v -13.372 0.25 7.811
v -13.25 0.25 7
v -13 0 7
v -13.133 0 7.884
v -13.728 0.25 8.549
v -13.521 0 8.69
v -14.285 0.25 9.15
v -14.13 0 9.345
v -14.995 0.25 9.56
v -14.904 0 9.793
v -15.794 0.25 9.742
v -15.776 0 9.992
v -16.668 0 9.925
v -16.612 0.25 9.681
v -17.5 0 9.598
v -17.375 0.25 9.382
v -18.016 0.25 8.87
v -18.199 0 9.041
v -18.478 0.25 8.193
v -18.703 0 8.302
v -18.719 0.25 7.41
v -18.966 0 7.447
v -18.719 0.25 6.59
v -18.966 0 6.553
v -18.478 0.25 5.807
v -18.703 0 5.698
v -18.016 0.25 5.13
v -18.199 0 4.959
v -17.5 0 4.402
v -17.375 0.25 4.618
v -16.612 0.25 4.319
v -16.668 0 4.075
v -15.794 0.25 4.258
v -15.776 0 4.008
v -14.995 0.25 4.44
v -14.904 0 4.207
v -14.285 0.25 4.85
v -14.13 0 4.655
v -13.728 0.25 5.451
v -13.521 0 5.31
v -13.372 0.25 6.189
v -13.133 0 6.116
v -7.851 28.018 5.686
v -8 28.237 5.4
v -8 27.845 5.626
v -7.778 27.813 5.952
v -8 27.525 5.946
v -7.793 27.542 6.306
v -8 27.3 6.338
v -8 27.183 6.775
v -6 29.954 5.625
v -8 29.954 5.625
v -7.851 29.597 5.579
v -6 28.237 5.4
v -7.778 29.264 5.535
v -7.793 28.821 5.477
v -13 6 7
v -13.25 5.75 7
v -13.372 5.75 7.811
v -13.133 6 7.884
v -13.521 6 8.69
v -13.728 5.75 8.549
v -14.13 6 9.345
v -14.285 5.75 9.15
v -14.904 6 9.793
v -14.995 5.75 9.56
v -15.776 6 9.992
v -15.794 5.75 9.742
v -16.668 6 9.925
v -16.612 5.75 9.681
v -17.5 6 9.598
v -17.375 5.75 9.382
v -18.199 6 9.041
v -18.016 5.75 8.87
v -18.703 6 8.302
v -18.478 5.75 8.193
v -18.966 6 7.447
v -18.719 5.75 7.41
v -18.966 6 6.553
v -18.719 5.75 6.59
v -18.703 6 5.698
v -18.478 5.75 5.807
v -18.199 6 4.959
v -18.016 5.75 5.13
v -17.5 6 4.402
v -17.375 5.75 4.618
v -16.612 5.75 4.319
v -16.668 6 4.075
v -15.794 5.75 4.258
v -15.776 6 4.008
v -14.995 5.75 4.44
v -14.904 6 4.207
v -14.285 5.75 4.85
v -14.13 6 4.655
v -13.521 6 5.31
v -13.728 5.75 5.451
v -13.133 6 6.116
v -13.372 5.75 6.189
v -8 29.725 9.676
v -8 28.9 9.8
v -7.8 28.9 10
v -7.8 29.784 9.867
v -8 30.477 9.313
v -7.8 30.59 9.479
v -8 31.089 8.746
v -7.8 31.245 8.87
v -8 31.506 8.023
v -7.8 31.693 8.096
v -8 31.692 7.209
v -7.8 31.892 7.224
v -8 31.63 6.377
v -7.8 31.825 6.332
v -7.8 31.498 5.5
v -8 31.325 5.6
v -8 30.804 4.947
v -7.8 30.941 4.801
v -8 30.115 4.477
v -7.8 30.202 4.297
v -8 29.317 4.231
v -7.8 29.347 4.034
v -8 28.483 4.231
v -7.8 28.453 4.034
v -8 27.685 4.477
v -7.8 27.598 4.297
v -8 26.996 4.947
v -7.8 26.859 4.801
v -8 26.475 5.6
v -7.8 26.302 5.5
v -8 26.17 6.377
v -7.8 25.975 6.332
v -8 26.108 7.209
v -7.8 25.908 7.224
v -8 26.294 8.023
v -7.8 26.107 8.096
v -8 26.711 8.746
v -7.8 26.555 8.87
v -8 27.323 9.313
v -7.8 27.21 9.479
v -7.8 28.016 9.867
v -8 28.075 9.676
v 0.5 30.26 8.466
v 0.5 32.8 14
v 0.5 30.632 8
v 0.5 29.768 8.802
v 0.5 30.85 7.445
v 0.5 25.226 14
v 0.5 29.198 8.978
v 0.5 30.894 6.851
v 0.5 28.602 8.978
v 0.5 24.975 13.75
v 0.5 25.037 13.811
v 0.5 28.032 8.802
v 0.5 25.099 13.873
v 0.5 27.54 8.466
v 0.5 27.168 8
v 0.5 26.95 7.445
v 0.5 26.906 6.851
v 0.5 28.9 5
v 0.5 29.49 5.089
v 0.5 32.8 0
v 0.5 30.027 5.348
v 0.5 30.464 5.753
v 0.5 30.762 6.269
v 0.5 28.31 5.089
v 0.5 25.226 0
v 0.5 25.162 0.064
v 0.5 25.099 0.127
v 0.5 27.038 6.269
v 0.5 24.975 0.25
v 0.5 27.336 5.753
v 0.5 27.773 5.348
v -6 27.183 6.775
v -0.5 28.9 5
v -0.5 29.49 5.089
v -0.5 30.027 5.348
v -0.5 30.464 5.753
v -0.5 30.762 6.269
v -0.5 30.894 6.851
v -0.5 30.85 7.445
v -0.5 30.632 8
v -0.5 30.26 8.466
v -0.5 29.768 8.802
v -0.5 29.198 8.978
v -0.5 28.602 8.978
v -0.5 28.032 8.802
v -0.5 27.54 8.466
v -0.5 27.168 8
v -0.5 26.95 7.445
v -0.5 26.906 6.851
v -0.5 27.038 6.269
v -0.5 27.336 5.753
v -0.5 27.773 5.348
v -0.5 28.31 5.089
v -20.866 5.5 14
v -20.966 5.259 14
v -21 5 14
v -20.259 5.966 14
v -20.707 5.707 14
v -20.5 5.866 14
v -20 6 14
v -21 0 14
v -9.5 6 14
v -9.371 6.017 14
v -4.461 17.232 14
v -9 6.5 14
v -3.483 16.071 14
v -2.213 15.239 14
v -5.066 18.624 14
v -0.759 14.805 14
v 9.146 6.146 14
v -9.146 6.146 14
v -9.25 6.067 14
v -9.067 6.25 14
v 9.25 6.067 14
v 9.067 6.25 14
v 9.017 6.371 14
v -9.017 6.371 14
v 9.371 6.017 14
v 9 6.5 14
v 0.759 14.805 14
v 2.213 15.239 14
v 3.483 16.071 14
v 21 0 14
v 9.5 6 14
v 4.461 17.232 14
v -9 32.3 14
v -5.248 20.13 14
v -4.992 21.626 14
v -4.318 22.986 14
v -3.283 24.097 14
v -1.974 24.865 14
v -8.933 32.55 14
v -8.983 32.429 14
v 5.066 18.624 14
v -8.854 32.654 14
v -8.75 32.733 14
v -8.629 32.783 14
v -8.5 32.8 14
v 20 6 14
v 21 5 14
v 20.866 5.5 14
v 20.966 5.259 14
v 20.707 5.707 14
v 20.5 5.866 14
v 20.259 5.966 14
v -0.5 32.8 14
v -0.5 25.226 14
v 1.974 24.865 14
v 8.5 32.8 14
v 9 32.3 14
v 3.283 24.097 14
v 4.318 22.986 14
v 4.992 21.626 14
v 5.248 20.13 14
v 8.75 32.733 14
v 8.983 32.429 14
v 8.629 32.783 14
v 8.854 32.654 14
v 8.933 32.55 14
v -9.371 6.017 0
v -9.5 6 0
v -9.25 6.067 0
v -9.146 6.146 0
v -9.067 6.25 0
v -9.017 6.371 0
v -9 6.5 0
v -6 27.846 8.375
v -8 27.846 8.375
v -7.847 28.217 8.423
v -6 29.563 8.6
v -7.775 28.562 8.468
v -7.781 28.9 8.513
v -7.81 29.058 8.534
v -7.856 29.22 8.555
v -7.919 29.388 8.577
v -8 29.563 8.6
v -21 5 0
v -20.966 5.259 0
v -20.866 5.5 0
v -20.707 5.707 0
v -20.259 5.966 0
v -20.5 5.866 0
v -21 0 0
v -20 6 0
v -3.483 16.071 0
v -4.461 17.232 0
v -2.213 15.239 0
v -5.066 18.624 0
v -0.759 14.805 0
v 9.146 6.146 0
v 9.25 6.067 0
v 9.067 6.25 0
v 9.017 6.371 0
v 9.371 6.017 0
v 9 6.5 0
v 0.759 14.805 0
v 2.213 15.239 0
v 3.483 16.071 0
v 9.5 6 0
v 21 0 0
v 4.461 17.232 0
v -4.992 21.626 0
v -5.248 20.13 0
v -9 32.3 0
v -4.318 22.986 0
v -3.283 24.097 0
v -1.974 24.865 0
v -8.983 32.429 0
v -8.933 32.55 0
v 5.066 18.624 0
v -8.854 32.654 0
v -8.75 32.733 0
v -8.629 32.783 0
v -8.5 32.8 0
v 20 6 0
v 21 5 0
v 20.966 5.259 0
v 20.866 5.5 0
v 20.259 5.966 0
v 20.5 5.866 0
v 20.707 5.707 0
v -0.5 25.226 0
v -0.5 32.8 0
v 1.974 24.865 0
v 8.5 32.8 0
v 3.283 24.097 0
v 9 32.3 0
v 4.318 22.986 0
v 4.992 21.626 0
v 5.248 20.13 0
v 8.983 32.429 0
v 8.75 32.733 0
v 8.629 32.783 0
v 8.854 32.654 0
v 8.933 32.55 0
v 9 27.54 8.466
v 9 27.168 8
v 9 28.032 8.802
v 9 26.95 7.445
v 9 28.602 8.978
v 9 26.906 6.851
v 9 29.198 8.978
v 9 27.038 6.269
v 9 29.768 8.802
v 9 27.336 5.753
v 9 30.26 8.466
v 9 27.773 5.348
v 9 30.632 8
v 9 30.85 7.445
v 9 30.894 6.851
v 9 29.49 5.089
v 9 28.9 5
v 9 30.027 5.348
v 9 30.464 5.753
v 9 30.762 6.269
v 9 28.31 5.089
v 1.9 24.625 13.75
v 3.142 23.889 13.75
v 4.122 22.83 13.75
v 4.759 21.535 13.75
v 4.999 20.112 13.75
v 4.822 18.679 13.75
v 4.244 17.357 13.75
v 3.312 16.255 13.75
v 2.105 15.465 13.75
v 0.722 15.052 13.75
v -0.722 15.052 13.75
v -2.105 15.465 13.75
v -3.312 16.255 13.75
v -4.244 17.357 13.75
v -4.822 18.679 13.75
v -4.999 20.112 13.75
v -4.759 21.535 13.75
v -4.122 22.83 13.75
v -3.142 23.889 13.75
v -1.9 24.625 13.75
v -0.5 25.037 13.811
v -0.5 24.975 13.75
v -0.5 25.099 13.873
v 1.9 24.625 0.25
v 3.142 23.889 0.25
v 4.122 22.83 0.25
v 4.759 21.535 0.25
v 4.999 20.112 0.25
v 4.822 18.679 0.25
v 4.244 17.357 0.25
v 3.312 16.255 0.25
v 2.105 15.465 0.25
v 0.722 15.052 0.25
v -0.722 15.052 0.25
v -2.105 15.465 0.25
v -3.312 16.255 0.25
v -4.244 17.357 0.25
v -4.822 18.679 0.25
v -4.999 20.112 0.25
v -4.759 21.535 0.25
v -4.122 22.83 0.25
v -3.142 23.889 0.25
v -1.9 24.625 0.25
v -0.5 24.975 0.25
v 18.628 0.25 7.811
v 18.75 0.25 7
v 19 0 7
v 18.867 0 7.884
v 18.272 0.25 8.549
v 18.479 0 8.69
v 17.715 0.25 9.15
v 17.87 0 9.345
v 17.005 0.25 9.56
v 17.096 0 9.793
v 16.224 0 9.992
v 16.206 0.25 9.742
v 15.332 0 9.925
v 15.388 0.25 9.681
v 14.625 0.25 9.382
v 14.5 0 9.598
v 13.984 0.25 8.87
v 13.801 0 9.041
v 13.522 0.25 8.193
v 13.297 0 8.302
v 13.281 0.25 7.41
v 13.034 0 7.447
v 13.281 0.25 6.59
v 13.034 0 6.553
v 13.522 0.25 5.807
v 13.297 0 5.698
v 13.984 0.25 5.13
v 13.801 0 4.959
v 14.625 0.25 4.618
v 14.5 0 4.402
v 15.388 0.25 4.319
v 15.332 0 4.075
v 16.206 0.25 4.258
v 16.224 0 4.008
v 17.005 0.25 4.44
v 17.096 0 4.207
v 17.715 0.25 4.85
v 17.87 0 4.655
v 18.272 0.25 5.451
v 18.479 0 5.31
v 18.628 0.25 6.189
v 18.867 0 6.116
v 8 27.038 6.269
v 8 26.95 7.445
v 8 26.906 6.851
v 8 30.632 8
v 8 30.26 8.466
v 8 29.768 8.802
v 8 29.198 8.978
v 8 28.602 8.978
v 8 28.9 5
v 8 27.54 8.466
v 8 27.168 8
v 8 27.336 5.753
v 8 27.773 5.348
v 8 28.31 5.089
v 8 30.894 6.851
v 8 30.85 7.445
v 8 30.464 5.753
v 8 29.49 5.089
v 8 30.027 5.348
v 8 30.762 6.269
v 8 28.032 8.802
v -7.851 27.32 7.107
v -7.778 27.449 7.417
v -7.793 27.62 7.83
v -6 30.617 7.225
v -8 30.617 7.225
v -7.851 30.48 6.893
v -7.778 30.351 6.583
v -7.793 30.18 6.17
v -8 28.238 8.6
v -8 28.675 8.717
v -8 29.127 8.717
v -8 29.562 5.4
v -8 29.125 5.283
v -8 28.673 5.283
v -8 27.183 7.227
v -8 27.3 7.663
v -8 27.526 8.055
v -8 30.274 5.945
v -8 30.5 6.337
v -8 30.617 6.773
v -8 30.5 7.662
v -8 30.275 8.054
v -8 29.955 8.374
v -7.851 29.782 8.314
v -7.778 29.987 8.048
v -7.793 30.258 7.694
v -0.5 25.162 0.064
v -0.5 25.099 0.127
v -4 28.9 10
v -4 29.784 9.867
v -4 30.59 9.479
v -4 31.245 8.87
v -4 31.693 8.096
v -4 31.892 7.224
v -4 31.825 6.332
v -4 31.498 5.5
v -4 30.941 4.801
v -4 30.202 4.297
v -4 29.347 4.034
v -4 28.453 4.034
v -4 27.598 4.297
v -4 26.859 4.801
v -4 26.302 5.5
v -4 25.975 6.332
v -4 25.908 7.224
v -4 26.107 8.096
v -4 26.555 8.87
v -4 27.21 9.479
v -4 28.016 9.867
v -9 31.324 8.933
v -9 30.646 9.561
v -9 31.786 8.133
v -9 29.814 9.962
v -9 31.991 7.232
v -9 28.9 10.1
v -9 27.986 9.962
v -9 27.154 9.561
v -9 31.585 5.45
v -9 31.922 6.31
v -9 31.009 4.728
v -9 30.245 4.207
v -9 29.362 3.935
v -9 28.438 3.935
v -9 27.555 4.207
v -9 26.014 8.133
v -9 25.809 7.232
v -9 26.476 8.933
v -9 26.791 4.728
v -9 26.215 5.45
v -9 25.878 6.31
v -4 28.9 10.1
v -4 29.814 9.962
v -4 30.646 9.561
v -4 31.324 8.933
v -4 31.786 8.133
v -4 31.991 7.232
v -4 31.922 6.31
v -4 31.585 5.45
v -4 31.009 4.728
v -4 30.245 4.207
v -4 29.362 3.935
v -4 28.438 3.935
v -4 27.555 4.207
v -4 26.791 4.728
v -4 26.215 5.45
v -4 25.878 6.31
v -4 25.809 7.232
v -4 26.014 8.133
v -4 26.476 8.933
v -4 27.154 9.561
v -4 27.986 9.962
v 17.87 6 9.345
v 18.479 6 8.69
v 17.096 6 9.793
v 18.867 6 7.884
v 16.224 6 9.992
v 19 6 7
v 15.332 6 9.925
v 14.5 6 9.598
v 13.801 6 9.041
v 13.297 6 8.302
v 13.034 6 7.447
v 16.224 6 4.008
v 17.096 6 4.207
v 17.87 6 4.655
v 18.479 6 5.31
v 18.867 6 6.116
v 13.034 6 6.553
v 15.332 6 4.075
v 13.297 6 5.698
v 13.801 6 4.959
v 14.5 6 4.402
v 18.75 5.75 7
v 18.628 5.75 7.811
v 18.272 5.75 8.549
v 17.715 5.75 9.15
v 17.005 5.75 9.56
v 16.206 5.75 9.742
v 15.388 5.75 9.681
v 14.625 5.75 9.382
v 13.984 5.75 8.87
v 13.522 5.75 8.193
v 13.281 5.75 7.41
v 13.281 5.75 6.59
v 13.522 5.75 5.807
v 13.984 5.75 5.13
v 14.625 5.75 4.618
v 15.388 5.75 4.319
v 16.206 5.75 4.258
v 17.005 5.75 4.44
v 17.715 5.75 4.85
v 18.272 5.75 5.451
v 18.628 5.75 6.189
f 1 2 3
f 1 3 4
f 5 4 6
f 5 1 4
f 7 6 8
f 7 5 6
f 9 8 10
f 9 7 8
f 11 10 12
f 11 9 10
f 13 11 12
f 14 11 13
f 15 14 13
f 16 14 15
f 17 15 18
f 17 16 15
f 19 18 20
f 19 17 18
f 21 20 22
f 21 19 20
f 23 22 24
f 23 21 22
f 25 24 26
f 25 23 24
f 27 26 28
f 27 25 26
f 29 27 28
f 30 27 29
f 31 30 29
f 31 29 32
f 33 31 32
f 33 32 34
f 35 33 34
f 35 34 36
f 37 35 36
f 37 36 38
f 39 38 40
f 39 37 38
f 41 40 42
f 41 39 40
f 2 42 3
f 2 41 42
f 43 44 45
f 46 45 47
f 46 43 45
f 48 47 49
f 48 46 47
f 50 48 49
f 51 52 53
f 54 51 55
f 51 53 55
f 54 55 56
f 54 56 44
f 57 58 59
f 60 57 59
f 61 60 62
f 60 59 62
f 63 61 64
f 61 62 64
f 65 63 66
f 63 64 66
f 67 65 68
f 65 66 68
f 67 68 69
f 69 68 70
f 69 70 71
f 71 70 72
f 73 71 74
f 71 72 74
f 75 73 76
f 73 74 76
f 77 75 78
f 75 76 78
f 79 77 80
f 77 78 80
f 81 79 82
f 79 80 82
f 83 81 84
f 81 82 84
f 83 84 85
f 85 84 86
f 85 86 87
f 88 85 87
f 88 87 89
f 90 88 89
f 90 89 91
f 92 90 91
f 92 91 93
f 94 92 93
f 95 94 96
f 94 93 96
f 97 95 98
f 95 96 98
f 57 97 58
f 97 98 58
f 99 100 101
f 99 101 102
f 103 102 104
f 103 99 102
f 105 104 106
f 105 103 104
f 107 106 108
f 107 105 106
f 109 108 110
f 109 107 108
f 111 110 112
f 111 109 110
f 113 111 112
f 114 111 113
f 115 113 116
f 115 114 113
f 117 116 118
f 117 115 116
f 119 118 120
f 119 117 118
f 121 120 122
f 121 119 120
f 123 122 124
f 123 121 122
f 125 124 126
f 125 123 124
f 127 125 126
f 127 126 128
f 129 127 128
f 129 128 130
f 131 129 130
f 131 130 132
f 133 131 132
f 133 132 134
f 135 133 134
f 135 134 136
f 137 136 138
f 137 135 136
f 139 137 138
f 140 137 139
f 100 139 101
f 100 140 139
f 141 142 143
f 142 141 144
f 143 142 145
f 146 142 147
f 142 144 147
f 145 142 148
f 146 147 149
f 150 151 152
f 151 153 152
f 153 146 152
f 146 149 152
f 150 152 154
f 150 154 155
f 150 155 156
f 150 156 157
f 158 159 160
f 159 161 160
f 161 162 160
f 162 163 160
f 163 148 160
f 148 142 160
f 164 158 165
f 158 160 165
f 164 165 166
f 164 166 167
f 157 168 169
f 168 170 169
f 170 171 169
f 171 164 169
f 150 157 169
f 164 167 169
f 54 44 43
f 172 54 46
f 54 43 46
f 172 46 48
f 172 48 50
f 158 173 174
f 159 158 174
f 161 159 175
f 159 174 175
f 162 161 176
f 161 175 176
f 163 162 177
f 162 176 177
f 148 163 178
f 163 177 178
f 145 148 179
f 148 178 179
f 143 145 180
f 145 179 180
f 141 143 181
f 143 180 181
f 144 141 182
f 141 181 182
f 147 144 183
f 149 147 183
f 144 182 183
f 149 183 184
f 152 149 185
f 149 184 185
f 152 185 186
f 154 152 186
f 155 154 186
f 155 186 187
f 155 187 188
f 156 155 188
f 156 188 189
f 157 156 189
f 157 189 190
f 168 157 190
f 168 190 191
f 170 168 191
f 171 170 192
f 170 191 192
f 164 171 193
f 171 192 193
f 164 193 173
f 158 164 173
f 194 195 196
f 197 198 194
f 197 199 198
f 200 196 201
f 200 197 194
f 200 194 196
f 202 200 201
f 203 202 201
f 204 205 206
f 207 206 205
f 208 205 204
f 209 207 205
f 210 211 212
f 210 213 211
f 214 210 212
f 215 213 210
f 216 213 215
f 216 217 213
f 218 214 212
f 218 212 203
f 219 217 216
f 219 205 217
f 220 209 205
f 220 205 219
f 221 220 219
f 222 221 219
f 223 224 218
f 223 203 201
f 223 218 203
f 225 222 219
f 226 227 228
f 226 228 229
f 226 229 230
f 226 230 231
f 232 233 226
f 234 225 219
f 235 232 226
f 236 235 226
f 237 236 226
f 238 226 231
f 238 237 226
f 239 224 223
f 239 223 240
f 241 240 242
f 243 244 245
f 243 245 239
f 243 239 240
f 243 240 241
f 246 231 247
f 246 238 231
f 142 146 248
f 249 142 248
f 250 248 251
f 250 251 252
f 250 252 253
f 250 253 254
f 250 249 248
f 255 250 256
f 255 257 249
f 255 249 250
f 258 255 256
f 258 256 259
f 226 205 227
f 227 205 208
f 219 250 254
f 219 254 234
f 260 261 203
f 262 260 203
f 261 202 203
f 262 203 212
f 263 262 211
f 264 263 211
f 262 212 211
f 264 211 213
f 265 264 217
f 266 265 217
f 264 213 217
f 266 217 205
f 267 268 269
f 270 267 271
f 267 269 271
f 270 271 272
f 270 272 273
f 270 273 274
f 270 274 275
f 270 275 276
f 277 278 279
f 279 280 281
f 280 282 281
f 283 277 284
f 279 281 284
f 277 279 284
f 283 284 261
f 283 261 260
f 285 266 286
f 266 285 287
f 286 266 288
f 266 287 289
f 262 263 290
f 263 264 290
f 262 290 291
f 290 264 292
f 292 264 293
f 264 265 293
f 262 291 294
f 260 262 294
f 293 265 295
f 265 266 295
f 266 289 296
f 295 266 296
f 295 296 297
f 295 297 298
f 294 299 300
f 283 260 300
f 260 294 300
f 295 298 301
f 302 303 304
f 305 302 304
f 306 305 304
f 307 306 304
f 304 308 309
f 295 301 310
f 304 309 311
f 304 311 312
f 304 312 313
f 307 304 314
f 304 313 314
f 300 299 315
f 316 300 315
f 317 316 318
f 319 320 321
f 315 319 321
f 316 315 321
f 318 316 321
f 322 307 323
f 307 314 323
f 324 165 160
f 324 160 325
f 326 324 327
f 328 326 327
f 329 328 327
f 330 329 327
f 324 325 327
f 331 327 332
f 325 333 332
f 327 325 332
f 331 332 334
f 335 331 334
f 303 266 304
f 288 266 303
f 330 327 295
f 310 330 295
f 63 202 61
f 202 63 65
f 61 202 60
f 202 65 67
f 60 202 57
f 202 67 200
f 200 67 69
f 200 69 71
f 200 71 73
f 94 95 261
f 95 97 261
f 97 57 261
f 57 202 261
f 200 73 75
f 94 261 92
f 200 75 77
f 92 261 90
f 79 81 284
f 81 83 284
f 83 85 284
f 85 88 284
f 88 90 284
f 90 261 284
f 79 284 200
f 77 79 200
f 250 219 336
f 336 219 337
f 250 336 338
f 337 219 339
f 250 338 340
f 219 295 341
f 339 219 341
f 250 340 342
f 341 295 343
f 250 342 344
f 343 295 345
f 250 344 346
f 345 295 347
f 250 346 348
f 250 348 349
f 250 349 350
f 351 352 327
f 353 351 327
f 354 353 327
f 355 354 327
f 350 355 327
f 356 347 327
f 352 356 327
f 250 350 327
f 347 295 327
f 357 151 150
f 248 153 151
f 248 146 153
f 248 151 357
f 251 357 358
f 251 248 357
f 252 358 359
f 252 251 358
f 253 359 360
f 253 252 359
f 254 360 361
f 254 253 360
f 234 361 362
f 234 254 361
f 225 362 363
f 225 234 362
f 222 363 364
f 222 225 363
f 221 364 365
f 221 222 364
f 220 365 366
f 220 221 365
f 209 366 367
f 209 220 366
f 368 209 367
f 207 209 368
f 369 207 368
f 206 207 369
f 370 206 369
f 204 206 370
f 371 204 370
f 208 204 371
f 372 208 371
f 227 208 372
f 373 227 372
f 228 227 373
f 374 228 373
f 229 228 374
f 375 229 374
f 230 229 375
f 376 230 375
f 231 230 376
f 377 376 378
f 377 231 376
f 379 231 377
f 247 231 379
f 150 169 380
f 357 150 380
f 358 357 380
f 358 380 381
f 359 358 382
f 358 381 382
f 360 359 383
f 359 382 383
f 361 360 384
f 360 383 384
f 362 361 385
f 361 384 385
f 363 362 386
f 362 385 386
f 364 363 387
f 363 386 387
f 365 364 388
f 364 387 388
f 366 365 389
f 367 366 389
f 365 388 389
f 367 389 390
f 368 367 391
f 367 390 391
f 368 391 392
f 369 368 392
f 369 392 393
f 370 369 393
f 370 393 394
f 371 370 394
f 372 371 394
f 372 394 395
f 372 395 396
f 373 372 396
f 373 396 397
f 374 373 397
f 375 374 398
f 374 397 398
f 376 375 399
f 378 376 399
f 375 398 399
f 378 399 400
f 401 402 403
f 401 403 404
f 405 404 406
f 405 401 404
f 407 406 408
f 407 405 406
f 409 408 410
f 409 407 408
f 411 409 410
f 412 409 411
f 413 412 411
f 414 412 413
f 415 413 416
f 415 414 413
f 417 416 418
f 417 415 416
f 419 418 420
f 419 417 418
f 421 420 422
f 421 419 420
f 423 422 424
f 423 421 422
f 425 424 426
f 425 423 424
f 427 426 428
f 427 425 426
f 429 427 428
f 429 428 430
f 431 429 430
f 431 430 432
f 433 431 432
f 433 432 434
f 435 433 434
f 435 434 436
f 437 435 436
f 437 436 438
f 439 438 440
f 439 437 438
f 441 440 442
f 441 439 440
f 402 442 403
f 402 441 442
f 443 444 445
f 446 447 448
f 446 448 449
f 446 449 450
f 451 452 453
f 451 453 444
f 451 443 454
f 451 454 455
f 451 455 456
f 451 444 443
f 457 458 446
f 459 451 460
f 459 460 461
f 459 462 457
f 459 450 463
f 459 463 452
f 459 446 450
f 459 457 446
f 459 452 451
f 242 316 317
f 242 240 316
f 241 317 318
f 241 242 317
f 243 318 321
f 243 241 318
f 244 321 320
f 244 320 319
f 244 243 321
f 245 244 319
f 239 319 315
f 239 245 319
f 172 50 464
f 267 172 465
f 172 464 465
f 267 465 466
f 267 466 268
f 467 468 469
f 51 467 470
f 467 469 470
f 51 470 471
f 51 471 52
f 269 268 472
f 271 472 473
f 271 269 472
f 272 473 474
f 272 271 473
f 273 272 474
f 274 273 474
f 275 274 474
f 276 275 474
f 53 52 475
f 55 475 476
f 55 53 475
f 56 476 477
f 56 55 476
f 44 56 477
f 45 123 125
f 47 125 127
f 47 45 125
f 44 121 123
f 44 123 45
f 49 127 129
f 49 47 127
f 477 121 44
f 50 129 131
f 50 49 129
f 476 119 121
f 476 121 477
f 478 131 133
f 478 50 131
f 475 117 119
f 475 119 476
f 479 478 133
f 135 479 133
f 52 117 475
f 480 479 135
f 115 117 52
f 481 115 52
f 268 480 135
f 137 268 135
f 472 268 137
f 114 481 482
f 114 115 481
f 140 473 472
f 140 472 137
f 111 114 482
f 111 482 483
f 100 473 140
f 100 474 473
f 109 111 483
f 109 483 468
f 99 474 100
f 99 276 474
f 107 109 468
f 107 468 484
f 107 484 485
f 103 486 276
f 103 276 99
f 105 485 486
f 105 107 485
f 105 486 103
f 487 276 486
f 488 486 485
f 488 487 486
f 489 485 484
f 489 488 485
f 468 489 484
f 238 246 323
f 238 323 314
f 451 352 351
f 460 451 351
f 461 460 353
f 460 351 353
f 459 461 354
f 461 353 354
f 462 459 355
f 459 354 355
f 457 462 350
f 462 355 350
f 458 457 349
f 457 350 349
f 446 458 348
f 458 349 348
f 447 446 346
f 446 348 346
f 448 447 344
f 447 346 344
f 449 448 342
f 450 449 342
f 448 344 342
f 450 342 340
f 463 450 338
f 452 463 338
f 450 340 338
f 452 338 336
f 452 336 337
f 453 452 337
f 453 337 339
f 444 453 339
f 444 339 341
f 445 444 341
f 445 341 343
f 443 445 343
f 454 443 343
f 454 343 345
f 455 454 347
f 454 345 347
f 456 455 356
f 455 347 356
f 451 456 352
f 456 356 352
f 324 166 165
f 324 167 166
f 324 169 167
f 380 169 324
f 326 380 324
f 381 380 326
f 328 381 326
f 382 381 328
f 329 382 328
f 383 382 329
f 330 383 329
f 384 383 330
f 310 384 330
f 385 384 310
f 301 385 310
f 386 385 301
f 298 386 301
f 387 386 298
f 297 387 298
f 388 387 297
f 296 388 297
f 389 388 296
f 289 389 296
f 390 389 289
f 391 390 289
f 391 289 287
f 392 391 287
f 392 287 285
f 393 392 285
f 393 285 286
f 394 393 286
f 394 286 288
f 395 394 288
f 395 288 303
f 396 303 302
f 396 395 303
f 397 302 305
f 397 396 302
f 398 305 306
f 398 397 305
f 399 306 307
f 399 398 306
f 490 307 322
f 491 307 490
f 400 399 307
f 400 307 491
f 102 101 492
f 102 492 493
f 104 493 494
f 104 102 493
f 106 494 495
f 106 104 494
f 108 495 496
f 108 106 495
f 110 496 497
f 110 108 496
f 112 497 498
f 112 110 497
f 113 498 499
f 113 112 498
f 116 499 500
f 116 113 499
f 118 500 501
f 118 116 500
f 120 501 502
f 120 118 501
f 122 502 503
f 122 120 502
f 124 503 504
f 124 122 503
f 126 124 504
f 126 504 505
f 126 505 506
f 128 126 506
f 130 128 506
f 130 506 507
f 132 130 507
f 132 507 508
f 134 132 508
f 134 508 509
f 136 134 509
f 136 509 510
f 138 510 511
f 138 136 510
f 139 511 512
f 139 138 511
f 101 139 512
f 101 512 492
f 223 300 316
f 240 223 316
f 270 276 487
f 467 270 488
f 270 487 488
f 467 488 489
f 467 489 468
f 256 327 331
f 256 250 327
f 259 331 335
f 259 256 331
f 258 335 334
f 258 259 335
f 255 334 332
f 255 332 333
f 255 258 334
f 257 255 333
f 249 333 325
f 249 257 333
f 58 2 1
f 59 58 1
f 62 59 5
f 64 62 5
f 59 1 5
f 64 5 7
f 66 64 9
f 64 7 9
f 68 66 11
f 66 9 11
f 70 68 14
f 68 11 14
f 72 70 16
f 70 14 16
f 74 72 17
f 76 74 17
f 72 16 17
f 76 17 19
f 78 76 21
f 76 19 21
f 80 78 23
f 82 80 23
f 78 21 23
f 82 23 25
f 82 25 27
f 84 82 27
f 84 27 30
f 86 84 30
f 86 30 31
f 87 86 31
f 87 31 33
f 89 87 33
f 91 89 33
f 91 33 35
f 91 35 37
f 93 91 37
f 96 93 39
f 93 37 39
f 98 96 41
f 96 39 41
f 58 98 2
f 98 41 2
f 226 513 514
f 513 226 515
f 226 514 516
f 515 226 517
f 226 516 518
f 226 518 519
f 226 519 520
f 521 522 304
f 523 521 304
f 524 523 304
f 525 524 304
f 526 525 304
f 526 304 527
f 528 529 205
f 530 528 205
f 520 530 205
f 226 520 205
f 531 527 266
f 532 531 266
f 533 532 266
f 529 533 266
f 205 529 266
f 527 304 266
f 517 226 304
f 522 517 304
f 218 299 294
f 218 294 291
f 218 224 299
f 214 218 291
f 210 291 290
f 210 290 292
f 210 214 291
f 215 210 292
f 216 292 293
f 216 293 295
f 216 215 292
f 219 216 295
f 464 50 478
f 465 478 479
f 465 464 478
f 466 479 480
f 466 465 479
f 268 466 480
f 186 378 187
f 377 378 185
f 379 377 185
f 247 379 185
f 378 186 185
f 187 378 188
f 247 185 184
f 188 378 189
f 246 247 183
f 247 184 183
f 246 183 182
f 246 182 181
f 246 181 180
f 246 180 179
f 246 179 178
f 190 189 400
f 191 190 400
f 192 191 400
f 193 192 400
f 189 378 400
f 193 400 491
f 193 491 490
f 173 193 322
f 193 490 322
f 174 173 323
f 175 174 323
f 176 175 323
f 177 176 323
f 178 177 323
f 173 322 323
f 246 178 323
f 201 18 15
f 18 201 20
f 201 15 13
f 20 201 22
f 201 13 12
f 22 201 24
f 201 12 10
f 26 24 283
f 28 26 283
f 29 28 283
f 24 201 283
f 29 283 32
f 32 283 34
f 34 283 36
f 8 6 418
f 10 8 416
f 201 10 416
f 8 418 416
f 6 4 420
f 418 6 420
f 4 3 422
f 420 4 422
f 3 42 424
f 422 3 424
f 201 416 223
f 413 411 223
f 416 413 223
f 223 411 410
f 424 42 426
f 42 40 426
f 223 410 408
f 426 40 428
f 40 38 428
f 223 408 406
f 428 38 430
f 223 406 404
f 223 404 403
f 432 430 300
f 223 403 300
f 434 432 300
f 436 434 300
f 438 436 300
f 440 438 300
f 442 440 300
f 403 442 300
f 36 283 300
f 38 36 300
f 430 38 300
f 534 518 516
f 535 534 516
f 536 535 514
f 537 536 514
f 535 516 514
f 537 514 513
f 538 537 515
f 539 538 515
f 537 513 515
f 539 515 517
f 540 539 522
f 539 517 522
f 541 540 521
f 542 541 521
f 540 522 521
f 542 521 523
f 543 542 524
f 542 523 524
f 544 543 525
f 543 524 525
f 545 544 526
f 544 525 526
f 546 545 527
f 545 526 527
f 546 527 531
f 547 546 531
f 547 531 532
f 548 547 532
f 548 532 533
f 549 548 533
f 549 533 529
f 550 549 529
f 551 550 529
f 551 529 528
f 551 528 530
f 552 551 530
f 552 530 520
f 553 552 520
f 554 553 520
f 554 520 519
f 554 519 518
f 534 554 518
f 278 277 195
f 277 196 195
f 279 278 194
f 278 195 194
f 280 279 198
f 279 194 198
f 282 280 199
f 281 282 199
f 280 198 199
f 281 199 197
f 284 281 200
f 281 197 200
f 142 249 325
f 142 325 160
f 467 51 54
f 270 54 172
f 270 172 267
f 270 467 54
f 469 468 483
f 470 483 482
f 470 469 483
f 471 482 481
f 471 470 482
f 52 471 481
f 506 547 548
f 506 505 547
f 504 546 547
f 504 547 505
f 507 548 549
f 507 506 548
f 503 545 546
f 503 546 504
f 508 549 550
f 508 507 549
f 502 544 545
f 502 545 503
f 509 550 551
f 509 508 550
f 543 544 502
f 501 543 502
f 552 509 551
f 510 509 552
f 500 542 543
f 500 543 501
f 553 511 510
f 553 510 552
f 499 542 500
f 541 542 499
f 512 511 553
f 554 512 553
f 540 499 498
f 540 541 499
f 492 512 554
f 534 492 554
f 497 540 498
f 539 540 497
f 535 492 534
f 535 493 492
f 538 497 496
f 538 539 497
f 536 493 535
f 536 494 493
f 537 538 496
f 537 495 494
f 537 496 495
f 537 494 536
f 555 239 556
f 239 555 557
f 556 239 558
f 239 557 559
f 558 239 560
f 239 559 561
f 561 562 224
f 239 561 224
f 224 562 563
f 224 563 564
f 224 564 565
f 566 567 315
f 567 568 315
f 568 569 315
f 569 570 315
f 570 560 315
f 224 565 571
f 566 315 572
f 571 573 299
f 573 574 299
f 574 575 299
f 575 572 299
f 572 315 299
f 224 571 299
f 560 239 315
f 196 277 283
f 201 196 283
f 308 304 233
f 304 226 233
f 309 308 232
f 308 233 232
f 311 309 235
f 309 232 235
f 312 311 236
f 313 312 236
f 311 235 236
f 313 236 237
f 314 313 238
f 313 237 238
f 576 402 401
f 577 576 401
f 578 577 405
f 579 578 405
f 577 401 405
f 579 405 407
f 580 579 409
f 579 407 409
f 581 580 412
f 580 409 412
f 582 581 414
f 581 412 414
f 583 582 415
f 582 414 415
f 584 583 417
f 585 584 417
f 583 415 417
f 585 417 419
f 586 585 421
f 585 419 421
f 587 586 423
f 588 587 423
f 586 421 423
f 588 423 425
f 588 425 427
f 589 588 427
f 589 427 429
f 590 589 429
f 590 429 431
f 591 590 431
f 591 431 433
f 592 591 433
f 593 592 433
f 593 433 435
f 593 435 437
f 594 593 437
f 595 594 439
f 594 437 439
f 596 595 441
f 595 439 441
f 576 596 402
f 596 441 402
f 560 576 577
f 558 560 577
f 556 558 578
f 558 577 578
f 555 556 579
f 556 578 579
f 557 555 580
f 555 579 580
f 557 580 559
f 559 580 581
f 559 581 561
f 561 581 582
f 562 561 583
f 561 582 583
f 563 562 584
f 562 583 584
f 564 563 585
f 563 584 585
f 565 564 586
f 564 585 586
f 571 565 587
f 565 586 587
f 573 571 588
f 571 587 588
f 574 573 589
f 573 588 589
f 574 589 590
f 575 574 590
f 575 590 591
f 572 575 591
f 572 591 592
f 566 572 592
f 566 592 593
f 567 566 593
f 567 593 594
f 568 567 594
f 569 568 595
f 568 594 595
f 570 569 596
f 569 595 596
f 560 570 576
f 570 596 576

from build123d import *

# Parameters (mm, degrees)
BOSS_EXTRUDE1_DEPTH     = 14
SKETCH3_R               = 2.75
CUT_EXTRUDE1_DEPTH      = 1
CUT_EXTRUDE1_DEPTH_BACK = 6
FILLET1_R               = 1
FILLET2_R               = 0.5
CHAMFER1_SIZE           = 0.25
SKETCH4_R               = 3.1
CUT_EXTRUDE2_DEPTH      = 1
SKETCH5_R               = 3.1
SKETCH5_R_2             = 3
CUT_EXTRUDE3_DEPTH      = 4
CHAMFER2_SIZE           = 0.2
CUT_EXTRUDE4_DEPTH      = 2
SKETCH7_R               = 2
BOSS_EXTRUDE2_DEPTH     = 1
SKETCH8_R               = 2
CUT_EXTRUDE5_DEPTH      = 1
SKETCH9_R               = 1.732050808
CUT_EXTRUDE6_DEPTH      = 1
CUT_EXTRUDE6_TAPER      = 45


with BuildPart() as part:
    # Sketch1 → Boss-Extrude1 (new body)
    with BuildSketch(Plane.XY):
        with BuildLine():
            Line((-21, 0), (21, 0))
            Line((21, 0), (21, 6))
            Line((21, 6), (9, 6))
            Line((9, 6), (9, 32.8))
            Line((9, 32.8), (0.5, 32.8))
            Line((0.5, 32.8), (0.5, 24.974937186))
            ThreePointArc((0.5, 24.974937186), (0, 15), (-0.5, 24.974937186))
            Line((-0.5, 24.974937186), (-0.5, 32.8))
            Line((-0.5, 32.8), (-9, 32.8))
            Line((-9, 32.8), (-9, 6))
            Line((-9, 6), (-21, 6))
            Line((-21, 6), (-21, 0))
        make_face()
    extrude(amount=BOSS_EXTRUDE1_DEPTH)

    # Sketch3 → Cut-Extrude1 (cut, two sides)
    with BuildSketch(Plane.XZ) as cut_extrude1_sk:
        with Locations((-16, 7)):
            Circle(SKETCH3_R)
        with Locations((16, 7)):
            Circle(SKETCH3_R)
    extrude(amount=CUT_EXTRUDE1_DEPTH, mode=Mode.SUBTRACT)
    extrude(cut_extrude1_sk.sketch, amount=-CUT_EXTRUDE1_DEPTH_BACK, mode=Mode.SUBTRACT)

    # Fillet1
    fillet1_edges = [part.edges().sort_by_distance(p)[0] for p in [
        (-21, 6, 7),
        (21, 6, 7),
    ]]
    fillet(fillet1_edges, radius=FILLET1_R)

    # Fillet2
    fillet2_edges = [part.edges().sort_by_distance(p)[0] for p in [
        (-9, 6, 7),
        (-9, 32.8, 7),
        (9, 32.8, 7),
        (9, 6, 7),
    ]]
    fillet(fillet2_edges, radius=FILLET2_R)

    # Chamfer1
    chamfer1_edges = [part.edges().sort_by_distance(p)[0] for p in [
        (0, 15, 0),
        (0, 15, 14),
        (13.25, 6, 7),
        (13.25, 0, 7),
        (-18.75, 6, 7),
        (-18.75, 0, 7),
    ]]
    chamfer(chamfer1_edges, length=CHAMFER1_SIZE)

    # Sketch4 → Cut-Extrude2 (cut)
    with BuildSketch(Plane.ZY.offset(9)):
        with Locations((7, 28.9)):
            Circle(SKETCH4_R)
    extrude(amount=-CUT_EXTRUDE2_DEPTH, mode=Mode.SUBTRACT)

    # Sketch5 → Cut-Extrude3 (cut)
    with BuildSketch(Plane.ZY.offset(8)):
        with Locations((7, 28.9)):
            Circle(SKETCH5_R)
        with Locations((7, 28.9)):
            Circle(SKETCH5_R_2, mode=Mode.SUBTRACT)
    extrude(amount=-CUT_EXTRUDE3_DEPTH, mode=Mode.SUBTRACT)

    # Chamfer2
    chamfer2_edges = [part.edges().sort_by_distance(p)[0] for p in [
        (-8, 28.9, 4),
    ]]
    chamfer(chamfer2_edges, length=CHAMFER2_SIZE)

    # Sketch6 → Cut-Extrude4 (cut)
    with BuildSketch(Plane.ZY.offset(8)):
        Polygon((7.225455606, 30.617314697), (5.625489649, 29.953907631), (5.400034043, 28.236592934), (6.774544394, 27.182685303), (8.374510351, 27.846092369), (8.599965957, 29.563407066), align=None)
    extrude(amount=-CUT_EXTRUDE4_DEPTH, mode=Mode.SUBTRACT)

    # Sketch7 → Boss-Extrude2 (add)
    with BuildSketch(Plane(origin=(-0.5, 0, 0), x_dir=(0, 0, -1), z_dir=(1, 0, 0))):
        with Locations((-7, 28.9)):
            Circle(SKETCH7_R)
    extrude(amount=BOSS_EXTRUDE2_DEPTH)

    # Sketch8 → Cut-Extrude5 (cut)
    with BuildSketch(Plane(origin=(9, 0, 0), x_dir=(0, 0, -1), z_dir=(1, 0, 0))):
        with Locations((-7, 28.9)):
            Circle(SKETCH8_R)
    extrude(amount=-CUT_EXTRUDE5_DEPTH, mode=Mode.SUBTRACT)

    # Sketch9 → Cut-Extrude6 (cut)
    with BuildSketch(Plane.ZY.offset(8)):
        with Locations((7, 28.9)):
            Circle(SKETCH9_R)
    extrude(amount=-CUT_EXTRUDE6_DEPTH, taper=CUT_EXTRUDE6_TAPER, mode=Mode.SUBTRACT)


solid = part.part
